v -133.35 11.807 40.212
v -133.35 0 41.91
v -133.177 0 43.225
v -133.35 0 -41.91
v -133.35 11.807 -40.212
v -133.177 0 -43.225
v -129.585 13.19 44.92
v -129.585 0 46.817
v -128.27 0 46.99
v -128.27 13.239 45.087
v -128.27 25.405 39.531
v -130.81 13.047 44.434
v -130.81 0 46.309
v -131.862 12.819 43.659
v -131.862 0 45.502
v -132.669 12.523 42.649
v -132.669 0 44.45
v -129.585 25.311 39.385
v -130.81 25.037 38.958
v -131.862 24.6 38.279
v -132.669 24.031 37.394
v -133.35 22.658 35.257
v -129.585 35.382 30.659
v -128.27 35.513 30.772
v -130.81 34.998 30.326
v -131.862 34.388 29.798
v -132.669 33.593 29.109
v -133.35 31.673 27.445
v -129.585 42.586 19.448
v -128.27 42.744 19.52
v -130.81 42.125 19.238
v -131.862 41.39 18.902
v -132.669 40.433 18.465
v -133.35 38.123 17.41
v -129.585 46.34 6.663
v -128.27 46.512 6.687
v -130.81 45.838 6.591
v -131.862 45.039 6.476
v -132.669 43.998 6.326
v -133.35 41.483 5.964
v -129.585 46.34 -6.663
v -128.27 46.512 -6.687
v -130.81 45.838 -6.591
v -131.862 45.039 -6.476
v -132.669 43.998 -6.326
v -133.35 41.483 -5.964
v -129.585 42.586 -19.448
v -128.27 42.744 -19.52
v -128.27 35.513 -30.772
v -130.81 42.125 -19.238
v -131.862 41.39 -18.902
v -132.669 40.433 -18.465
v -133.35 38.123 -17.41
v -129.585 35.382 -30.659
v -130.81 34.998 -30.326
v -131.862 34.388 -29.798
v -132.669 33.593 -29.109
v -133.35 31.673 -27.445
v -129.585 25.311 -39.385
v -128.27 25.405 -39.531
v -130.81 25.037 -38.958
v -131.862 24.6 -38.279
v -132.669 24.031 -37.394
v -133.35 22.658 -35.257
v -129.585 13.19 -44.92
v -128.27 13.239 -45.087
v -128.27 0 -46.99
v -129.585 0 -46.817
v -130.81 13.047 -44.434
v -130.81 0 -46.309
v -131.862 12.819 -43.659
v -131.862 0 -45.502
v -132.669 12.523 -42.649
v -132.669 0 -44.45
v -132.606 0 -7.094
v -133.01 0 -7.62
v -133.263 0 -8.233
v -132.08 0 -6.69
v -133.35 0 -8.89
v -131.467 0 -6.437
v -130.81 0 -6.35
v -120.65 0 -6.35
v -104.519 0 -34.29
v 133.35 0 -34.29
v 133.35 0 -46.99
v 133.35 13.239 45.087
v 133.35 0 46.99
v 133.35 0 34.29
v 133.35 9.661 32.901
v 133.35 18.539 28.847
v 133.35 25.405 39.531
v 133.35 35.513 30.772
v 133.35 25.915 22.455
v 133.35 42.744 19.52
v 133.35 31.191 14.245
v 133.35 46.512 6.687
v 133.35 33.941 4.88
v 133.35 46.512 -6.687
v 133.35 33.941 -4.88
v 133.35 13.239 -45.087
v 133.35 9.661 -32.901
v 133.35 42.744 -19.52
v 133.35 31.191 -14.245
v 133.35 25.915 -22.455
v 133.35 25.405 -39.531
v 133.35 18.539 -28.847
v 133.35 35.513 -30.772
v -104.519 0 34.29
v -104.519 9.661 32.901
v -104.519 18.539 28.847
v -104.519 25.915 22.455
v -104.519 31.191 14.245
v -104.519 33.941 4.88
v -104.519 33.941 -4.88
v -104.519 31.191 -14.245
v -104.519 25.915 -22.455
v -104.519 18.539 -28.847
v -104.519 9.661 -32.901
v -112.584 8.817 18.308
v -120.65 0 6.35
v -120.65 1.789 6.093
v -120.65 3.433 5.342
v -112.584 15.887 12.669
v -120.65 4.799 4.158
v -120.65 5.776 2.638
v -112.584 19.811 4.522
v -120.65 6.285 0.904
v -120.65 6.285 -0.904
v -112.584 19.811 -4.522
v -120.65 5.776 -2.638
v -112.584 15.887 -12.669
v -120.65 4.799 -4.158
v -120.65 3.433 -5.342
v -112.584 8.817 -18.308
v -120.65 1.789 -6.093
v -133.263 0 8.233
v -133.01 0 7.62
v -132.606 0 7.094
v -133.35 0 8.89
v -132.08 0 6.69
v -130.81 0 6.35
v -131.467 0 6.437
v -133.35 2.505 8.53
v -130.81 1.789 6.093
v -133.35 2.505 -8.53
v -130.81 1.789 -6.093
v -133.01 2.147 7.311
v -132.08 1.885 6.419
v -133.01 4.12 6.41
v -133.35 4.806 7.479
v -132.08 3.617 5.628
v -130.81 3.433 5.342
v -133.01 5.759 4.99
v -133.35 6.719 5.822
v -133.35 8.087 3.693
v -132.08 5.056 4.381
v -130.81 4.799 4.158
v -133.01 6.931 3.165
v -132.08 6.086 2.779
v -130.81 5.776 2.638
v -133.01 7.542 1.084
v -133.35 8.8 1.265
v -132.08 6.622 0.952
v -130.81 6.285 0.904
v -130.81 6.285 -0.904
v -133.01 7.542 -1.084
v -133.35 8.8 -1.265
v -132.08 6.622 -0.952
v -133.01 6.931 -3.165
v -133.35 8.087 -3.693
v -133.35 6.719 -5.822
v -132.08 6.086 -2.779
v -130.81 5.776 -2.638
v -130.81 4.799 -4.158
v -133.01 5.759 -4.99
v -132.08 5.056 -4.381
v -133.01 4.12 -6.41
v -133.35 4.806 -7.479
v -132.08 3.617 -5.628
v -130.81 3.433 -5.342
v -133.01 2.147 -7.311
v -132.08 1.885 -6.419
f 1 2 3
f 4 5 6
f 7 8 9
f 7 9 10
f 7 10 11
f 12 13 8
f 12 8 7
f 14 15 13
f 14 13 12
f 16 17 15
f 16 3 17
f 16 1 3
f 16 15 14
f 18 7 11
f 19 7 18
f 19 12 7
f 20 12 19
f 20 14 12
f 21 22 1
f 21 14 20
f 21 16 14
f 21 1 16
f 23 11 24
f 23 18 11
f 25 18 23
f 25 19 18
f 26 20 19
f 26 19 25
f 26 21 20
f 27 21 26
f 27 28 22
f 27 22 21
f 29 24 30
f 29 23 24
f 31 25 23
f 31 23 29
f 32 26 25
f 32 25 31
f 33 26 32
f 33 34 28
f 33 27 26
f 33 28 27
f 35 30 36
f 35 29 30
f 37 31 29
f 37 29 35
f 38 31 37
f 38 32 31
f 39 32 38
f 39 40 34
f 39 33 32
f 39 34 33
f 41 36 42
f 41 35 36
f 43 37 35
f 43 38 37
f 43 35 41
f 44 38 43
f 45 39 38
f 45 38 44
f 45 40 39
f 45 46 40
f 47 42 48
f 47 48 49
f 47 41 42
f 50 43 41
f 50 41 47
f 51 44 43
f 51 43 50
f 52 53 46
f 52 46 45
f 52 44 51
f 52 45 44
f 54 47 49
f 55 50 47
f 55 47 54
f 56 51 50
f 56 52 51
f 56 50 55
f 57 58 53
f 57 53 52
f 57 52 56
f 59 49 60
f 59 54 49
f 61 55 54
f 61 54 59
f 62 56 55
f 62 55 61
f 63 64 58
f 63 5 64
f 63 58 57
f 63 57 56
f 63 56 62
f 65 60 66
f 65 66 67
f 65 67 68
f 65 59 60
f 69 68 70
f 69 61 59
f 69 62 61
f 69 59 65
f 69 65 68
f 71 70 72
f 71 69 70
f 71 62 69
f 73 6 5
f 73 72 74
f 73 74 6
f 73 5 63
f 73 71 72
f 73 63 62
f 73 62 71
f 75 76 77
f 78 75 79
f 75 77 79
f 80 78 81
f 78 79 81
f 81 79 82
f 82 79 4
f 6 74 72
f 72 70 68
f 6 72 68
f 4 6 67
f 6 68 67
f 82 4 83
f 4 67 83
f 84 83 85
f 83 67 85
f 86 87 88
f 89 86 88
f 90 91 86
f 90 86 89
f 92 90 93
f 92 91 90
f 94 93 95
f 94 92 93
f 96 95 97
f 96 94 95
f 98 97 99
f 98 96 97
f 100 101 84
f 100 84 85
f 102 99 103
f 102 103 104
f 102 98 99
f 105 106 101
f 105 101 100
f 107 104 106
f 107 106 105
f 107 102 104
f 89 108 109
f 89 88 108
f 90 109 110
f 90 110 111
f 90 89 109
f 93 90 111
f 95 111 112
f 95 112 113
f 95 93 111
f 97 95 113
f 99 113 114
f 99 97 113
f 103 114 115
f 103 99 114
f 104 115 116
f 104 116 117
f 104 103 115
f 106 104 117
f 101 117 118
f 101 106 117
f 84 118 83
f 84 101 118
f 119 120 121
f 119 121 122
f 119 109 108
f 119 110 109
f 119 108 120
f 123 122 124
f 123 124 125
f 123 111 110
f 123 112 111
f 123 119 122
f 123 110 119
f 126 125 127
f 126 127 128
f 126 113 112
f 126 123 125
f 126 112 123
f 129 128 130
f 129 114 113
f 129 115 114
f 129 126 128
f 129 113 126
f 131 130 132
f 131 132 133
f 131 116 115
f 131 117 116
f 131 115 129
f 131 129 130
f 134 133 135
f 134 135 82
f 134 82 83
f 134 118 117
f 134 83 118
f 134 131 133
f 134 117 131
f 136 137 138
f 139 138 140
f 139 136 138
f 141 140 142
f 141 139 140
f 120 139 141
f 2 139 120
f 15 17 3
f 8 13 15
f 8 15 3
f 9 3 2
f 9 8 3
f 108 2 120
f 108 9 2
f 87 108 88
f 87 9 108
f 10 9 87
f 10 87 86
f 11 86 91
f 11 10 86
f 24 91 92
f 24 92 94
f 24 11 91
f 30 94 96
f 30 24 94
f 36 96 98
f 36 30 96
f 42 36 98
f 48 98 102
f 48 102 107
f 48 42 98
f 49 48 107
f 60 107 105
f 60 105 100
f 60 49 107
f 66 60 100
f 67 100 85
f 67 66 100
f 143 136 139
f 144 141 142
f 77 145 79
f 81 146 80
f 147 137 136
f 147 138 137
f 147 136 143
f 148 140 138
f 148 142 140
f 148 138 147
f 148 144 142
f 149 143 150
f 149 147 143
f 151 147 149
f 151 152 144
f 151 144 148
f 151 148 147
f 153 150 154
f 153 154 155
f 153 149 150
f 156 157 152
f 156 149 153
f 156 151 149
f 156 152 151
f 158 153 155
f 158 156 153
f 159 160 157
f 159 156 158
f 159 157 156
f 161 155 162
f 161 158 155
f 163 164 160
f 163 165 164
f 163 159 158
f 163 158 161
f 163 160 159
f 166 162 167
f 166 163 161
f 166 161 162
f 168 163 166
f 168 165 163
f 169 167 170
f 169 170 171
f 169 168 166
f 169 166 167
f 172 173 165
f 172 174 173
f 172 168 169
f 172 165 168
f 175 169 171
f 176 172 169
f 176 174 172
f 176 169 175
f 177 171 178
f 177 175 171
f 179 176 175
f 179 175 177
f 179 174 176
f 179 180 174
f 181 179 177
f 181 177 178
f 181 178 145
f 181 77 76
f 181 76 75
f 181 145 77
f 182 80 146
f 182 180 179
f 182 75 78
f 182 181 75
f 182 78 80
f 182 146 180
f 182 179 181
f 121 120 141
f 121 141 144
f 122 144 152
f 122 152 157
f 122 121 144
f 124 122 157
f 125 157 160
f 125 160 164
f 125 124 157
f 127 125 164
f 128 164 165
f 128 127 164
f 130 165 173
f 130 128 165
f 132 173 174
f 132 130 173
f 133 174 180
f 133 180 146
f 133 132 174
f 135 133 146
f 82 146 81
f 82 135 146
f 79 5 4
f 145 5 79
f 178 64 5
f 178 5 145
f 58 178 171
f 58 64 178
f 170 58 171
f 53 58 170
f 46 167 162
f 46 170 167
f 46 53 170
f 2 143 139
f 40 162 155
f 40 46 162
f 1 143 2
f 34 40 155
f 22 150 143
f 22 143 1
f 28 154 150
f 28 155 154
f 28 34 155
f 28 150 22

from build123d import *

# Parameters (mm, degrees)
F1_ANGLE = -180
F2_R     = 5.08
F3_R     = 2.54


with BuildPart() as f1:
    # F0 (on Front) → F1 (revolve)
    with BuildSketch(Plane.XZ):
        Polygon((133.35, 46.99), (-133.35, 46.99), (-133.35, 6.35), (-120.65, 6.35), (-104.518833, 34.29), (133.35, 34.29), align=None)
    revolve(axis=Axis((1.08064, 0, 0), (1, 0, 0)), revolution_arc=F1_ANGLE)

    # F2
    f2_edges = [f1.edges().sort_by_distance(p)[0] for p in [
        (-133.35, 46.99, 0),
    ]]
    fillet(f2_edges, radius=F2_R)

    # F3
    f3_edges = [f1.edges().sort_by_distance(p)[0] for p in [
        (-133.35, 6.35, 0),
    ]]
    fillet(f3_edges, radius=F3_R)


solid = f1.part
